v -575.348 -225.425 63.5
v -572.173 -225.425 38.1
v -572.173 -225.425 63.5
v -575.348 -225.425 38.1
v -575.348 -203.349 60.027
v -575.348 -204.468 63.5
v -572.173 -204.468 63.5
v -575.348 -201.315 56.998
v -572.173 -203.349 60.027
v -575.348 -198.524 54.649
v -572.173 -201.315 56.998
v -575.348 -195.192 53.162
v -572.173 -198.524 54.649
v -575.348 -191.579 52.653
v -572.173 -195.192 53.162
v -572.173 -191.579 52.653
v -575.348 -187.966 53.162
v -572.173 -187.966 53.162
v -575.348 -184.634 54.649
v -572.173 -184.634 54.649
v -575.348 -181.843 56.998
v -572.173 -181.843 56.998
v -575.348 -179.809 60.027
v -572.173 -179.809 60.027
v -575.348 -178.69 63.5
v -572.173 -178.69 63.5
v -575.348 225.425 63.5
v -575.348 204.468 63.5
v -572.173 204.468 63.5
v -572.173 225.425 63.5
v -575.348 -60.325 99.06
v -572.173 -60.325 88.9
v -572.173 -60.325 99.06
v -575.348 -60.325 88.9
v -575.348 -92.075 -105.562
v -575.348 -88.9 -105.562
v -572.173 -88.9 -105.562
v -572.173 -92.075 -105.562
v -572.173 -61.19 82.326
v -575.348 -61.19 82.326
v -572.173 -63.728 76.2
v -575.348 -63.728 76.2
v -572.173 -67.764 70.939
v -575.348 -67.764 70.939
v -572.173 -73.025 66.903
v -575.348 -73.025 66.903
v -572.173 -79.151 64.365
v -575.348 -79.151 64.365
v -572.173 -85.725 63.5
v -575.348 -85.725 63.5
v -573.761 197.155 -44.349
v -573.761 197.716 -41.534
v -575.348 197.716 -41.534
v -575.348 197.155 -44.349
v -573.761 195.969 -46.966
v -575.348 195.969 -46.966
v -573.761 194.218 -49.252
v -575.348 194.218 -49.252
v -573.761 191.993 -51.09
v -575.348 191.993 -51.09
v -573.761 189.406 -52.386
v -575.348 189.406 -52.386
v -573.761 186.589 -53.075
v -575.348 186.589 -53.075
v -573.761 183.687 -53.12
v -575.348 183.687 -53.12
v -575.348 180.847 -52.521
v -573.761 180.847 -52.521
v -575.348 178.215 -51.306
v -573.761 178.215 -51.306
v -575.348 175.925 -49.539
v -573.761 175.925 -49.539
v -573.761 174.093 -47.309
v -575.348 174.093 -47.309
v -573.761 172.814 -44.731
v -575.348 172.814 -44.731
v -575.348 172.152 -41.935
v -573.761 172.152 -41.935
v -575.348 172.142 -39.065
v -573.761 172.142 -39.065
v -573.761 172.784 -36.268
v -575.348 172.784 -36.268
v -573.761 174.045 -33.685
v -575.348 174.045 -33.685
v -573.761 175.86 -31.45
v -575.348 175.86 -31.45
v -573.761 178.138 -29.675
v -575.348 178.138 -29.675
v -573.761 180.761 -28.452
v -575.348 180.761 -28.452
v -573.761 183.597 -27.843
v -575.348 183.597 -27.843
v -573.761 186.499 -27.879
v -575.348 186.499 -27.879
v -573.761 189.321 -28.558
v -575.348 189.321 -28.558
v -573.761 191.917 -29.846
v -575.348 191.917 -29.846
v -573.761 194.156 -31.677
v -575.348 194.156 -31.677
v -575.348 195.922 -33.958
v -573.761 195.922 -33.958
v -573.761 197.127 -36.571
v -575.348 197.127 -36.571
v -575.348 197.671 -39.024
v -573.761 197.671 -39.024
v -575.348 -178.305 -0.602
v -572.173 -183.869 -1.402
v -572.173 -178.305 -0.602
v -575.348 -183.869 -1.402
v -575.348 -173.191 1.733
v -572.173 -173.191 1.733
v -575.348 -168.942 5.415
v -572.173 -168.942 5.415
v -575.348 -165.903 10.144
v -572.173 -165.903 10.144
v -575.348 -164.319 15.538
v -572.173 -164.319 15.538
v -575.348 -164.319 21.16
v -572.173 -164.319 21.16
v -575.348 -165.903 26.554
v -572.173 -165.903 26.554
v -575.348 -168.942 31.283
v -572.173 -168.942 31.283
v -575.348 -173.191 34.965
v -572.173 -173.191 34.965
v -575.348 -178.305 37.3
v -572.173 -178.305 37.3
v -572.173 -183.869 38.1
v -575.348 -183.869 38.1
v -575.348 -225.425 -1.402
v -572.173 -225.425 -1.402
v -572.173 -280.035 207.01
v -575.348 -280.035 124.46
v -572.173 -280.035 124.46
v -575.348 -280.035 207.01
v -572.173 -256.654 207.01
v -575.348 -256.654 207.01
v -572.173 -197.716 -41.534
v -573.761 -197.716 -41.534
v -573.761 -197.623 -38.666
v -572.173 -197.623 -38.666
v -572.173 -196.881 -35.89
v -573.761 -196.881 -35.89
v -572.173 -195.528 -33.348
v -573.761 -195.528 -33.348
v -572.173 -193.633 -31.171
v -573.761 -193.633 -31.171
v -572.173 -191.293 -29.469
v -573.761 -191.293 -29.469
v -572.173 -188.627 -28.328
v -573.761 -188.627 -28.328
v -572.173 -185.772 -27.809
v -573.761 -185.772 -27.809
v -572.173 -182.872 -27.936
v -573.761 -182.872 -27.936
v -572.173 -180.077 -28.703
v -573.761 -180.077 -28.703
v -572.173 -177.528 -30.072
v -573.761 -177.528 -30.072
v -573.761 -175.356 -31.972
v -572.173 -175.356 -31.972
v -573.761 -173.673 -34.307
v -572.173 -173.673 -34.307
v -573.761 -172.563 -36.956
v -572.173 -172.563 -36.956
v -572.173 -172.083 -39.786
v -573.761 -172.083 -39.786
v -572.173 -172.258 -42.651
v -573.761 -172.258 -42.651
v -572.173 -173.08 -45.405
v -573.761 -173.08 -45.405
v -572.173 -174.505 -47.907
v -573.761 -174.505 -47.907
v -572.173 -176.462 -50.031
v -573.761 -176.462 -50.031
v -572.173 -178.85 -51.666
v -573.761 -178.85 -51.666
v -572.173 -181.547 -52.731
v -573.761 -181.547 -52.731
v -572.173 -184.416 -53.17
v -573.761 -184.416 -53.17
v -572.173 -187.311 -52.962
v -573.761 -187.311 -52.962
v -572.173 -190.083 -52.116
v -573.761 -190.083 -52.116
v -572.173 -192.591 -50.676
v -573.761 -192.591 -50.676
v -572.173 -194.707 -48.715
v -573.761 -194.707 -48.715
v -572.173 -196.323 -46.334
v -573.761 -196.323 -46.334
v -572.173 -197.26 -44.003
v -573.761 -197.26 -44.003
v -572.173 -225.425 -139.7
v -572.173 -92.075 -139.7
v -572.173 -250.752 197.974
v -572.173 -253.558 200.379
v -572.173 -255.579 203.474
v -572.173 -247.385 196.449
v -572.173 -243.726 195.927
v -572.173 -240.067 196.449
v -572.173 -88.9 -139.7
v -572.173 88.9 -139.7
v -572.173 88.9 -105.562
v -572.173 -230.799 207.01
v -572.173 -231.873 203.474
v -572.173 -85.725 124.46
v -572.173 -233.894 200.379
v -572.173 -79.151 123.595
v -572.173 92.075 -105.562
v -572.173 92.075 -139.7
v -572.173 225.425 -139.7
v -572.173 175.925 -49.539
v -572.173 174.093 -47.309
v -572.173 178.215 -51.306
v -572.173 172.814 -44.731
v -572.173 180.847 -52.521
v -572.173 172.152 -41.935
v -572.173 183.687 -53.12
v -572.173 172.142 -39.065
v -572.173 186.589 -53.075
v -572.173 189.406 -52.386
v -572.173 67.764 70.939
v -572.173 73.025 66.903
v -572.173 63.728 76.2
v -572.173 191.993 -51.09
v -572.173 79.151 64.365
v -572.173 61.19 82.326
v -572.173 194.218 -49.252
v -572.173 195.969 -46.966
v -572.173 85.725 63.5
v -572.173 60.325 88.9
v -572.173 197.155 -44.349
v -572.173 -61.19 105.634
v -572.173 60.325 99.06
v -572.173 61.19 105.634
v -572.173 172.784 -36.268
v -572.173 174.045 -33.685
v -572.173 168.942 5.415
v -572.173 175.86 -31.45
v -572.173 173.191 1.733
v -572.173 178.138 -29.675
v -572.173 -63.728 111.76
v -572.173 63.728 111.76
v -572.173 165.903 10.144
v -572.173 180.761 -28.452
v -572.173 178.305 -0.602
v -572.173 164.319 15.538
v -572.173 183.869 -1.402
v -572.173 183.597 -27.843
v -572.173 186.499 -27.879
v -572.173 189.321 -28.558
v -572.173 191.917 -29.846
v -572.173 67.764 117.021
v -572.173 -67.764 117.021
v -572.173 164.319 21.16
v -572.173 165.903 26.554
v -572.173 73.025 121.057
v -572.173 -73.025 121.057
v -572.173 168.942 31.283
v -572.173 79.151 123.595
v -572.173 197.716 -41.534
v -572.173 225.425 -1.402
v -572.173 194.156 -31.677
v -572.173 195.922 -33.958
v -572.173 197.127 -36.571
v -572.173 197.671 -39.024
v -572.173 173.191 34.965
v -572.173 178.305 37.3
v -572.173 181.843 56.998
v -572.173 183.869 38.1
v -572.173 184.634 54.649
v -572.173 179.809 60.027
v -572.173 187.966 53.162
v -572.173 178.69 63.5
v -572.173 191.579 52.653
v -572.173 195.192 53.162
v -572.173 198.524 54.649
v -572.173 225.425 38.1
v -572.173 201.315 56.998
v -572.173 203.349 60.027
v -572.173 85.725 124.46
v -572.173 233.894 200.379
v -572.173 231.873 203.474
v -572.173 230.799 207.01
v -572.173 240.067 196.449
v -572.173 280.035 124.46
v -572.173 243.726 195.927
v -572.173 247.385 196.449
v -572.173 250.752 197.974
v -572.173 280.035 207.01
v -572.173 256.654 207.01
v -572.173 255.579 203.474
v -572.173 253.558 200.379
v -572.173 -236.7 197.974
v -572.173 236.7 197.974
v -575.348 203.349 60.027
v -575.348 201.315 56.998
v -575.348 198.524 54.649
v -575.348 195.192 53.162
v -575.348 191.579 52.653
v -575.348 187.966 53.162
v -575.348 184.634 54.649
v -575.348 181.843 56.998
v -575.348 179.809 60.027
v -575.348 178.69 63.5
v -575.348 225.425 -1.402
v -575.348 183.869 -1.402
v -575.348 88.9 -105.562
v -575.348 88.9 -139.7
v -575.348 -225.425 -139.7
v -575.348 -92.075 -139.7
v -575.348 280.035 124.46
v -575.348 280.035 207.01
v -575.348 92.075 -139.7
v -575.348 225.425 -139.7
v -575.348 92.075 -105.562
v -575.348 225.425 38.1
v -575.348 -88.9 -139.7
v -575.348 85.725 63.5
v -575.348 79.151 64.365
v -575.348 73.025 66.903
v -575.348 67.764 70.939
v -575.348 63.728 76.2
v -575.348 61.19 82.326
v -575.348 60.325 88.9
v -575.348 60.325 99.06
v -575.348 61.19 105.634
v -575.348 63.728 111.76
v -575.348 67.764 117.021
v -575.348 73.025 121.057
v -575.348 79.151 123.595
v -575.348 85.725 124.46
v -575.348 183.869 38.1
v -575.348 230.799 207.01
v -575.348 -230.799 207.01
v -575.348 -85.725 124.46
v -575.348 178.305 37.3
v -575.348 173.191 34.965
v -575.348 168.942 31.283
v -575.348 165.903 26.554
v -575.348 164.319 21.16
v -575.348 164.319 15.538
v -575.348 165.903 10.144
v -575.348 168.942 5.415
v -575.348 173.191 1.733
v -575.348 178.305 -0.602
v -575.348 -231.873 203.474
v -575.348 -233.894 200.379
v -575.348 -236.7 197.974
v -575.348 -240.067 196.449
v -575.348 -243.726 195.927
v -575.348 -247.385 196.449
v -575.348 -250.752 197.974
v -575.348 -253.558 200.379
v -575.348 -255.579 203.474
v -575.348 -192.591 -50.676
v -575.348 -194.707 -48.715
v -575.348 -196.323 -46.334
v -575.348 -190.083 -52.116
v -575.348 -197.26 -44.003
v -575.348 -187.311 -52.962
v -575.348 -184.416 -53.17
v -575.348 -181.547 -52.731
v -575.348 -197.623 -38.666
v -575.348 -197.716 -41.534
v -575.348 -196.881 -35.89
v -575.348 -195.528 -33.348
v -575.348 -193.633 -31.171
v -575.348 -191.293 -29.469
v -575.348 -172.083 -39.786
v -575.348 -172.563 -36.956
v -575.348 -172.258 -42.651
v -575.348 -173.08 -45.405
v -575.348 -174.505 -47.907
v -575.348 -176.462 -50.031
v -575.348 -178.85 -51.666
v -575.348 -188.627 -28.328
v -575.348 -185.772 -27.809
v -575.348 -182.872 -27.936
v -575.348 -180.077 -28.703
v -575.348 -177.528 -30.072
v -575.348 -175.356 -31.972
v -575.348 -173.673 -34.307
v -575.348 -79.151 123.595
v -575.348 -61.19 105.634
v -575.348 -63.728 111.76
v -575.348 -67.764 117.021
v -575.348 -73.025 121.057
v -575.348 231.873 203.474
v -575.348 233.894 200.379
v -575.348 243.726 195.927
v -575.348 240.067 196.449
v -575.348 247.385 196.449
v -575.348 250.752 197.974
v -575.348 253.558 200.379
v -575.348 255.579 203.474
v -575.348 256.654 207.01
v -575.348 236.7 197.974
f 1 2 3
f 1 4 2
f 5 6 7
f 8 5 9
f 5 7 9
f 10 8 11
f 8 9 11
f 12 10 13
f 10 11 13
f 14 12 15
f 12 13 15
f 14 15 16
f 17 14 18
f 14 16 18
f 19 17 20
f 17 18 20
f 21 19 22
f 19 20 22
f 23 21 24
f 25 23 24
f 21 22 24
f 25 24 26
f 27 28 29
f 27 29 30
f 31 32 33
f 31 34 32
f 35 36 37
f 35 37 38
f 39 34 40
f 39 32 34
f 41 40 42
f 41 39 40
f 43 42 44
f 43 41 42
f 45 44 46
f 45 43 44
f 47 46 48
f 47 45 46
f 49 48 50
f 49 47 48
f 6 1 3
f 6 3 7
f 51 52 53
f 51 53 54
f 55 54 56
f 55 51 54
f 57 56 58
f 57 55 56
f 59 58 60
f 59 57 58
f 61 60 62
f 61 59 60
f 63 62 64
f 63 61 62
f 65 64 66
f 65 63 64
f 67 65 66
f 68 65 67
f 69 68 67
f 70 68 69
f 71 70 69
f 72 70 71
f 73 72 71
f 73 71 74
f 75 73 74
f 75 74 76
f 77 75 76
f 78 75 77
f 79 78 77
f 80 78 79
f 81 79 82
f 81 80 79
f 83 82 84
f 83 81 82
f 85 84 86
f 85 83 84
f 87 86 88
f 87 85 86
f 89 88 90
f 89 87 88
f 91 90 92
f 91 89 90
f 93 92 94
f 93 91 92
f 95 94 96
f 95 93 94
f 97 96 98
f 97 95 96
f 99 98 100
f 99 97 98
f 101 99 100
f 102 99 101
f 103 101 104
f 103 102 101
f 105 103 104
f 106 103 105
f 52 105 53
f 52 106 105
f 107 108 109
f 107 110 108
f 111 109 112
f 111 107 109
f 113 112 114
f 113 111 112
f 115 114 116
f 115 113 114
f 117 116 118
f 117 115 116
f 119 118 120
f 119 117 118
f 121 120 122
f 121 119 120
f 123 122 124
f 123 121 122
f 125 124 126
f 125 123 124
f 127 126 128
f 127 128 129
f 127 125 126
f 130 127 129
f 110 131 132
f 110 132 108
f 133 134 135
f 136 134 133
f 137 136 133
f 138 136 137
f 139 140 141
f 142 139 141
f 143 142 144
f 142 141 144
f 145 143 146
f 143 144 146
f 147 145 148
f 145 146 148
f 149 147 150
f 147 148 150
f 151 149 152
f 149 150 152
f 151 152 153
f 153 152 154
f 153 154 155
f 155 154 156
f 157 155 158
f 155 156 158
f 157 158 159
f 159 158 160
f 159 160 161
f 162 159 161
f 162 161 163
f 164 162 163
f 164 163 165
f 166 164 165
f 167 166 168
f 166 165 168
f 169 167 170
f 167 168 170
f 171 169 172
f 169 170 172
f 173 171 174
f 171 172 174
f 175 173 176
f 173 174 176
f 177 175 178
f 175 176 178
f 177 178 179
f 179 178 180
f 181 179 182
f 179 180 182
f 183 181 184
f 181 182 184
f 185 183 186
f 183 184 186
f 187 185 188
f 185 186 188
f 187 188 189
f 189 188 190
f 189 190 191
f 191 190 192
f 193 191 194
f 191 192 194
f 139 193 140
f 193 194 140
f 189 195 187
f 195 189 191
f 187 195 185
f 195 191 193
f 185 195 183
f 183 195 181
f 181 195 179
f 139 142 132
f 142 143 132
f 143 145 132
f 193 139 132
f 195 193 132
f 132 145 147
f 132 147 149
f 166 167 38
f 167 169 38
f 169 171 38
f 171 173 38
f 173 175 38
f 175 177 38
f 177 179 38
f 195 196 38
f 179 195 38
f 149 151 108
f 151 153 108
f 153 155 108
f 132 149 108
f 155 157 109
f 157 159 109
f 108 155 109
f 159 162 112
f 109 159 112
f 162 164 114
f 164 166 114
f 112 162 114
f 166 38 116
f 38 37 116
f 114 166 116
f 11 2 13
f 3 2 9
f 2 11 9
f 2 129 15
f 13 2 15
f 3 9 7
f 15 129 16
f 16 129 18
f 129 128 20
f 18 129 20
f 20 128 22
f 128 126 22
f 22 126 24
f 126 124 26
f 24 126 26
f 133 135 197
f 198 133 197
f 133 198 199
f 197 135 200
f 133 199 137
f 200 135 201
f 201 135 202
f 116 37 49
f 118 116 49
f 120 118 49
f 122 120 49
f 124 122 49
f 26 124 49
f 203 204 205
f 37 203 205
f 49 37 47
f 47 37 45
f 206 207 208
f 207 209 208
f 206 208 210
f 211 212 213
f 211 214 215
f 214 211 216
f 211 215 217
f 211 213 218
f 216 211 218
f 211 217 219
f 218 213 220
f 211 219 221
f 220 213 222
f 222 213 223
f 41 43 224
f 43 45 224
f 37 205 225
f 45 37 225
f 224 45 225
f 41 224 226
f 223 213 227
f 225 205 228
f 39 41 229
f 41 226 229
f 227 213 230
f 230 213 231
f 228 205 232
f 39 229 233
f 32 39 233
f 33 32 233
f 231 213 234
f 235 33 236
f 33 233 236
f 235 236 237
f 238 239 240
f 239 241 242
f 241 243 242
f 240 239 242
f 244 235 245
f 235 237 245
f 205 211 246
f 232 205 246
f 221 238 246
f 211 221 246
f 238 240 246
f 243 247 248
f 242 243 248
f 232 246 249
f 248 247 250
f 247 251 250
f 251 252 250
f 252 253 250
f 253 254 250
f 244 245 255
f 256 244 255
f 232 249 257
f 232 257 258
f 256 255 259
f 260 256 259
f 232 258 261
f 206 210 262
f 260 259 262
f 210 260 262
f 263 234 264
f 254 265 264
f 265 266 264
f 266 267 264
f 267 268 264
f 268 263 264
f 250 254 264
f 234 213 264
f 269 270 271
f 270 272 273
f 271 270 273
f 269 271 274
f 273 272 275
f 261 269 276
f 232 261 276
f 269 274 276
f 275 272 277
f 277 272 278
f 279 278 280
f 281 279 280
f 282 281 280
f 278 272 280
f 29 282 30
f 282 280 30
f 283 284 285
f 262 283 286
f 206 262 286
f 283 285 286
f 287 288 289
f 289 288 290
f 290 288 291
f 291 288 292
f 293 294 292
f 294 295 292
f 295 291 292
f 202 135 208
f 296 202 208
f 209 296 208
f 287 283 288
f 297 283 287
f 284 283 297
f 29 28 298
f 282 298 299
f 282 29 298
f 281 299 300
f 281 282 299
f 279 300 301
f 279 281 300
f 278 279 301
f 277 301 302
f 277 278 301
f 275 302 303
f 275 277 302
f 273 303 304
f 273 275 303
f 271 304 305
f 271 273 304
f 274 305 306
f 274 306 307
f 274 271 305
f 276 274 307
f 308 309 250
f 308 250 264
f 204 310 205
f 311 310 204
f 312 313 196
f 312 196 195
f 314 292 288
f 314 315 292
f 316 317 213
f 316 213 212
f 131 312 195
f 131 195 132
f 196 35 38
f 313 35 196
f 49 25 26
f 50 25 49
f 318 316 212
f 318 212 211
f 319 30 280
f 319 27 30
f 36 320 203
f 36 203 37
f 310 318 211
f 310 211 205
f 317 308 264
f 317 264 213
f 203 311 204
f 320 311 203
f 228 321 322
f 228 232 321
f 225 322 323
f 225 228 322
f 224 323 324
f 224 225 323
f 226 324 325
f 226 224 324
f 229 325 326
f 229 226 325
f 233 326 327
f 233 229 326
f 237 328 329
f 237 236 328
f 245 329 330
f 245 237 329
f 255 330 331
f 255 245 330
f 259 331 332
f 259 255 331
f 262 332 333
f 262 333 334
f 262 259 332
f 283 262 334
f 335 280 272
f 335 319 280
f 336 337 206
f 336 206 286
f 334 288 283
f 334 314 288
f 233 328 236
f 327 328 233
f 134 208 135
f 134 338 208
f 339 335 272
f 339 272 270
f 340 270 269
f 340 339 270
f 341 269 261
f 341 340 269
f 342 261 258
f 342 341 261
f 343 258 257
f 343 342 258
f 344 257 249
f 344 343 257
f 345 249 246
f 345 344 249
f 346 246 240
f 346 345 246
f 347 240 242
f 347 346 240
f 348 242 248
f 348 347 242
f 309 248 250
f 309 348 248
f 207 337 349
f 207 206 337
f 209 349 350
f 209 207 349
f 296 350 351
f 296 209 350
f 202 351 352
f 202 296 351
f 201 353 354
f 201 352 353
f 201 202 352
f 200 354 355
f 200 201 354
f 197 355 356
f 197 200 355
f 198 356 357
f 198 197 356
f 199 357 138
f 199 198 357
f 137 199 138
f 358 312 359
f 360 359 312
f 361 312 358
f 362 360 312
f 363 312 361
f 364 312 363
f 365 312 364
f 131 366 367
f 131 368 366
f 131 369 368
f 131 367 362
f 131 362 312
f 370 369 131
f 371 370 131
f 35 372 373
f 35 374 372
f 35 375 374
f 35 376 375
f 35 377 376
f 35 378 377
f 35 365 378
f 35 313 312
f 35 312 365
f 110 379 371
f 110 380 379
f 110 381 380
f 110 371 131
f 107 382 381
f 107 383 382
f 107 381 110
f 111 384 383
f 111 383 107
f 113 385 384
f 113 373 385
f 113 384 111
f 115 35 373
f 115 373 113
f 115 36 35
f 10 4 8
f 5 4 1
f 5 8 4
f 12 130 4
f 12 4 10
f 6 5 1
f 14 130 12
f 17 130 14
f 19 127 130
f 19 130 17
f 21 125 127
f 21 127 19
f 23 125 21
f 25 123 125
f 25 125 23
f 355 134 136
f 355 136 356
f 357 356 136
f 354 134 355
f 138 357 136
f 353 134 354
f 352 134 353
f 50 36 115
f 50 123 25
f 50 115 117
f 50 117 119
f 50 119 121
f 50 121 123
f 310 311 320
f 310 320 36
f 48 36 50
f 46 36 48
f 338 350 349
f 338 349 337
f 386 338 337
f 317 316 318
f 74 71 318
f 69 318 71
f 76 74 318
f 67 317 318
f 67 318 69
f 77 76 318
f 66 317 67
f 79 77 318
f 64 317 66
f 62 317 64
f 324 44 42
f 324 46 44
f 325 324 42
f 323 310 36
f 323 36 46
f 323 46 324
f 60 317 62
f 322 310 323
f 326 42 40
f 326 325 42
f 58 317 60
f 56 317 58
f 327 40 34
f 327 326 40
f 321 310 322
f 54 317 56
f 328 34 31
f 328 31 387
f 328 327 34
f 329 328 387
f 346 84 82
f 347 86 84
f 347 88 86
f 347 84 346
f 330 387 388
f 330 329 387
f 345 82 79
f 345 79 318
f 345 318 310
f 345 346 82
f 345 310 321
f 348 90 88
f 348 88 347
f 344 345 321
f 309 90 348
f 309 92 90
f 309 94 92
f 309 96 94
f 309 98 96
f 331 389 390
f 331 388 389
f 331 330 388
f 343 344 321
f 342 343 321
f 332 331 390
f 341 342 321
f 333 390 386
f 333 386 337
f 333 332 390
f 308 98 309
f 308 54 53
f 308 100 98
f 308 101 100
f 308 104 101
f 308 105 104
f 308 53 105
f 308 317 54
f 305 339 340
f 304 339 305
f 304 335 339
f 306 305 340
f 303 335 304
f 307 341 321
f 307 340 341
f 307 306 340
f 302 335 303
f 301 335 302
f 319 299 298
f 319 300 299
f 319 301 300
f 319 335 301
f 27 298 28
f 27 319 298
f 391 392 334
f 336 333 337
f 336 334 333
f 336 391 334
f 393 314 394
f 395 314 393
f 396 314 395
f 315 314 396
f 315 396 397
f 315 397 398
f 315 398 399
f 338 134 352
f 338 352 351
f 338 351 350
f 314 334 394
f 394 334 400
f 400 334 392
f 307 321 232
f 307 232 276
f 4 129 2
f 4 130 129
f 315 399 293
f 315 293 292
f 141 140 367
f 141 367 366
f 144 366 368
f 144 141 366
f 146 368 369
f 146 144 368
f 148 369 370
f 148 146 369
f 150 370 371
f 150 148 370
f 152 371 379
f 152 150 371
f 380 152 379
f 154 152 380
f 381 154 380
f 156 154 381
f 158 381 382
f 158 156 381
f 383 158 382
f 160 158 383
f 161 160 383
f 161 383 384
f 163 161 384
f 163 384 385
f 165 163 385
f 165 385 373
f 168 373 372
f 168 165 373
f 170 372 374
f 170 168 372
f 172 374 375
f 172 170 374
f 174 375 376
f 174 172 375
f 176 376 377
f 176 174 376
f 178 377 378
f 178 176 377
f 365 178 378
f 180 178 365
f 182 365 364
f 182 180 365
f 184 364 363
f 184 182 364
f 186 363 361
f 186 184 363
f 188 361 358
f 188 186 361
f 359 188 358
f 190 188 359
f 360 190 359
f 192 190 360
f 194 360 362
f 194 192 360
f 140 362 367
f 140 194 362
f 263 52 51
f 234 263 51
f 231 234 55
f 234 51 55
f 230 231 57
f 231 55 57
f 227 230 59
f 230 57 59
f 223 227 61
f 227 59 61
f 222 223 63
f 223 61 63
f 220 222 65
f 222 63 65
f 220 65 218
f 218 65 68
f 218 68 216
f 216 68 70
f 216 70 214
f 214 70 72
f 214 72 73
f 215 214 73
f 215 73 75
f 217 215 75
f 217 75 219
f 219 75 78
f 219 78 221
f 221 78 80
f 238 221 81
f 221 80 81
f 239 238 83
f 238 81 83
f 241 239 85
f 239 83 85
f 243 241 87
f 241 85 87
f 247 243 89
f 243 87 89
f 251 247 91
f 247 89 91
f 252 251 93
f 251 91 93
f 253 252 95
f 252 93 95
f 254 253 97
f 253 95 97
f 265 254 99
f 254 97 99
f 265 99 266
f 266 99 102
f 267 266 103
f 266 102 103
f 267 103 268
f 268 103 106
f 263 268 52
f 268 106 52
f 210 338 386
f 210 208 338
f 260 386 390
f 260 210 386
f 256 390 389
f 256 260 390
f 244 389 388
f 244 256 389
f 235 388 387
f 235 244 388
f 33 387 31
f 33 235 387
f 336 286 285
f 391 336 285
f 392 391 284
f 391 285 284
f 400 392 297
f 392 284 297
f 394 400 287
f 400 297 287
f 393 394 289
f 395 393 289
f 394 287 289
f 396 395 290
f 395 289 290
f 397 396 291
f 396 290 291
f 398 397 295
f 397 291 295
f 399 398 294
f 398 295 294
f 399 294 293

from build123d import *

# Parameters (mm, degrees)
SKETCH1_RX          = 12.847459174
SKETCH1_RY          = 12.7
BOSS_EXTRUDE1_DEPTH = 1.5875
SKETCH3_R           = 13.081
CUT_EXTRUDE1_DEPTH  = 118.1481
SKETCH4_R           = 13.081
CUT_EXTRUDE2_DEPTH  = 118.1481
FILLET1_R           = 25.4


with BuildPart() as part:
    # Sketch1 → Boss-Extrude1 (new, symmetric)
    with BuildSketch(Plane.ZY.offset(573.7606)):
        with BuildLine():
            Line((38.1, 225.425), (38.1, 183.869089605))
            ThreePointArc((38.1, 183.869089605), (18.348846559, 164.117936165), (-1.402306881, 183.869089605))
            Line((-1.402306881, 183.869089605), (-1.402306881, 225.425))
            Line((-1.402306881, 225.425), (-139.7, 225.425))
            Line((-139.7, 225.425), (-139.7, 92.075))
            Line((-139.7, 92.075), (-105.5624, 92.075))
            Line((-105.5624, 92.075), (-105.5624, 88.9))
            Line((-105.5624, 88.9), (-139.7, 88.9))
            Line((-139.7, 88.9), (-139.7, -88.9))
            Line((-139.7, -88.9), (-105.5624, -88.9))
            Line((-105.5624, -88.9), (-105.5624, -92.075))
            Line((-105.5624, -92.075), (-139.7, -92.075))
            Line((-139.7, -92.075), (-139.7, -225.425))
            Line((-139.7, -225.425), (-1.402306881, -225.425))
            Line((-1.402306881, -225.425), (-1.402306881, -183.869089605))
            ThreePointArc((-1.402306881, -183.869089605), (18.348846559, -164.117936165), (38.1, -183.869089605))
            Line((38.1, -183.869089605), (38.1, -225.425))
            Line((38.1, -225.425), (63.5, -225.425))
            Line((63.5, -225.425), (63.5, -60.325))
            Line((63.5, -60.325), (124.46, -60.325))
            Line((124.46, -60.325), (124.46, -280.035))
            Line((124.46, -280.035), (207.01, -280.035))
            Line((207.01, -280.035), (207.01, 280.035))
            Line((207.01, 280.035), (124.46, 280.035))
            Line((124.46, 280.035), (124.46, 60.325))
            Line((124.46, 60.325), (63.5, 60.325))
            Line((63.5, 60.325), (63.5, 225.425))
            Line((63.5, 225.425), (38.1, 225.425))
        make_face()
        with Locations(Location((-40.479630886, 184.911482002), (0, 0, 94.708027414))):
            Ellipse(SKETCH1_RX, SKETCH1_RY, mode=Mode.SUBTRACT)
        with Locations(Location((-40.479630886, -184.911482002), (0, 0, -94.708027414))):
            Ellipse(SKETCH1_RX, SKETCH1_RY, mode=Mode.SUBTRACT)
    extrude(amount=BOSS_EXTRUDE1_DEPTH, both=True)

    # Sketch3 → Cut-Extrude1 (cut)
    with BuildSketch(Plane(origin=(-457.2, 191.578892686, 65.734499214), x_dir=(0, 0, 1), z_dir=(-1, 0, 0))):
        Circle(SKETCH3_R)
    cut_extrude1 = extrude(amount=CUT_EXTRUDE1_DEPTH, mode=Mode.SUBTRACT)

    # Sketch4 → Cut-Extrude2 (cut)
    with BuildSketch(Plane(origin=(-457.2, 243.726115798, 209.007817696), x_dir=(0, 0, -1), z_dir=(1, 0, 0))):
        Circle(SKETCH4_R)
    cut_extrude2 = extrude(amount=-CUT_EXTRUDE2_DEPTH, mode=Mode.SUBTRACT)

    # Mirror1: Cut-Extrude1, Cut-Extrude2 across plane
    add(cut_extrude1.mirror(Plane.ZX), mode=Mode.SUBTRACT)
    add(cut_extrude2.mirror(Plane.ZX), mode=Mode.SUBTRACT)

    # Fillet1
    fillet1_edges = [part.edges().sort_by_distance(p)[0] for p in [
        (-573.7606, 60.325, 63.5),
        (-573.7606, 60.325, 124.46),
        (-573.7606, -60.325, 124.46),
        (-573.7606, -60.325, 63.5),
    ]]
    fillet(fillet1_edges, radius=FILLET1_R)


solid = part.part
